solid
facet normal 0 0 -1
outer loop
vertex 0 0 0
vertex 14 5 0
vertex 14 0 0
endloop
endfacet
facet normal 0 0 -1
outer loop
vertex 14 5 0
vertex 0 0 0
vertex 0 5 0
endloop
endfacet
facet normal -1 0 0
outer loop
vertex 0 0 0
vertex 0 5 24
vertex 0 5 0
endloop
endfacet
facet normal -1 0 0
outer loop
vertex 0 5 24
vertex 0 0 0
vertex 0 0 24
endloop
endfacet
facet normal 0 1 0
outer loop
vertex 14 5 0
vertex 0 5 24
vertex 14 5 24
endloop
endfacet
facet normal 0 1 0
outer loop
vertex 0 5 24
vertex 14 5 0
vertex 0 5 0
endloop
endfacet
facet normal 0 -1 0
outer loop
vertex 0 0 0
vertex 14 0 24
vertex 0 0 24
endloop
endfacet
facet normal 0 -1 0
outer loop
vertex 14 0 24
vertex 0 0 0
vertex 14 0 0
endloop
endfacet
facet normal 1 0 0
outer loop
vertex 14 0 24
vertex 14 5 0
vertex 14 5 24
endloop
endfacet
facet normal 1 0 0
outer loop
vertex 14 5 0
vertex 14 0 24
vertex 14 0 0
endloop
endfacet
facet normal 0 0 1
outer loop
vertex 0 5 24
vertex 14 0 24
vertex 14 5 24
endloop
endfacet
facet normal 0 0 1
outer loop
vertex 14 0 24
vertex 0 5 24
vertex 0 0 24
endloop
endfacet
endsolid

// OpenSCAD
translate([3.5, 2.5, 1.5]) color([0.6383635452384463, 0.42323888002080157, 0.5212286449626529]) cube([7, 5, 3], center=true);
translate([10.5, 2.5, 1.5]) color([0.6793183678168555, 0.8877818831984722, 0.8335334993782705]) cube([7, 5, 3], center=true);
translate([3.5, 2.5, 4.5]) color([0.998183045526196, 0.635064793155105, 0.8746990054994174]) cube([7, 5, 3], center=true);
translate([10.5, 2.5, 4.5]) color([0.5428090736997917, 0.9313134045807503, 0.009704659433814156]) cube([7, 5, 3], center=true);
translate([3.5, 2.5, 7.5]) color([0.7055937347007278, 0.7470388851985934, 0.3182594390073298]) cube([7, 5, 3], center=true);
translate([10.5, 2.5, 7.5]) color([0.32182488616904803, 0.5251073848334467, 0.8744832594460391]) cube([7, 5, 3], center=true);
translate([3.5, 2.5, 10.5]) color([0.6025867148054135, 0.15590536476920036, 0.37900510864666237]) cube([7, 5, 3], center=true);
translate([10.5, 2.5, 10.5]) color([0.2943823465565715, 0.7063732058335496, 0.47043138046830235]) cube([7, 5, 3], center=true);
translate([3.5, 2.5, 13.5]) color([0.799945824478888, 0.5165278007752844, 0.9155142682747232]) cube([7, 5, 3], center=true);
translate([10.5, 2.5, 13.5]) color([0.06635468620874474, 0.13049414784187097, 0.3004482911175872]) cube([7, 5, 3], center=true);
translate([3.5, 2.5, 16.5]) color([0.7588987264331779, 0.4485890964462933, 0.8619033855251227]) cube([7, 5, 3], center=true);
translate([10.5, 2.5, 16.5]) color([0.8006454493762514, 0.8686955098516022, 0.4607350972935428]) cube([7, 5, 3], center=true);
translate([3.5, 2.5, 19.5]) color([0.37132186818867685, 0.38223256097056324, 0.5298076607467874]) cube([7, 5, 3], center=true);
translate([10.5, 2.5, 19.5]) color([0.033618014856222844, 0.09064689039119589, 0.7941451579713075]) cube([7, 5, 3], center=true);
translate([3.5, 2.5, 22.5]) color([0.5179983582932232, 0.6001422851572377, 0.07635810782734587]) cube([7, 5, 3], center=true);
translate([10.5, 2.5, 22.5]) color([0.42636667866841493, 0.7546182662703457, 0.2896641383723638]) cube([7, 5, 3], center=true);
translate([9.5, 1.0, 16.5]) color([0.9011387199060191, 0.4178406508691356, 0.9725485107467589]) cube([5, 2, 3], center=true);
translate([13.0, 2.5, 16.5]) color([0.8454919814395919, 0.9722338049752182, 0.6074299110948179]) cube([2, 5, 3], center=true);
